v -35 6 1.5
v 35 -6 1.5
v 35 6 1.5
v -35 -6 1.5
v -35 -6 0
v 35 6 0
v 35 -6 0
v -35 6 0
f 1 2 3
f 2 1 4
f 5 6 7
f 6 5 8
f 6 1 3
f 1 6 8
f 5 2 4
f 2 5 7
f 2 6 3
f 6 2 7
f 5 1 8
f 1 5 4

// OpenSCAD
// 10-well agarose gel comb
// Designed for FDM printing, lying flat on the XY plane.

// --- Dimensions ---
spine_l     = 70.0;    // Length of the spine (X)
spine_w     = 12.0;    // Width of the spine (Y)
plate_t     = 1.5;     // Thickness of the plate (Z)
tooth_w     = 5.0;     // Width of each tooth (X)
tooth_l     = 12.0;    // Length of each tooth (Y)
gap         = 1.5;     // Gap between teeth
num_teeth   = 10;      // Number of teeth

$fn = 64;

// --- Calculations ---
// Total width of the teeth array (from start of first tooth to end of last)
// Total X = (num_teeth * tooth_w) + ((num_teeth - 1) * gap)
total_teeth_x = (num_teeth * tooth_w) + ((num_teeth - 1) * gap);

// Offset to center the teeth array along the X axis of the spine
// The teeth array starts at (x_offset - total_teeth_x/2)
x_offset = (spine_l - total_teeth_x) / 2;

// The teeth hang from one long edge in the -Y direction.
// Spine Y range: [-spine_w/2, spine_w/2]
// Teeth Y range: [-spine_w/2 - tooth_l, -spine_w/2]

union() {
    // Main Body: The spine
    // Centered on X and Y, sitting on Z=0
    translate([-spine_l/2, -spine_w/2, 0])
        cube([spine_l, spine_w, plate_t]);
    
    // The Teeth
    for (i = [0 : num_teeth - 1]) {
        // Calculate X position for this tooth
        // We center the whole array by starting at the calculated x_offset
        // and subtracting half the tooth width to align the edge.
        tx = (x_offset - total_teeth_x/2) + (i * (tooth_w + gap));
        
        // Translate to position: 
        // X: centered on the spine
        // Y: attached to the edge (spine_w/2) and extending in -Y direction
        // Note: The prompt says "hang from one long edge... in the -Y direction"
        // If the edge is at +spine_w/2, hanging in -Y means Y goes from spine_w/2 down to spine_w/2 - tooth_l.
        // However, standard comb design usually extends away from the spine.
        // To "hang in the -Y direction" from the edge at +spine_w/2:
        // Y range: [spine_w/2 - tooth_l, spine_w/2]
        
        translate([tx, spine_w/2 - tooth_l, 0])
            cube([tooth_w, tooth_l, plate_t]);
    }
}
